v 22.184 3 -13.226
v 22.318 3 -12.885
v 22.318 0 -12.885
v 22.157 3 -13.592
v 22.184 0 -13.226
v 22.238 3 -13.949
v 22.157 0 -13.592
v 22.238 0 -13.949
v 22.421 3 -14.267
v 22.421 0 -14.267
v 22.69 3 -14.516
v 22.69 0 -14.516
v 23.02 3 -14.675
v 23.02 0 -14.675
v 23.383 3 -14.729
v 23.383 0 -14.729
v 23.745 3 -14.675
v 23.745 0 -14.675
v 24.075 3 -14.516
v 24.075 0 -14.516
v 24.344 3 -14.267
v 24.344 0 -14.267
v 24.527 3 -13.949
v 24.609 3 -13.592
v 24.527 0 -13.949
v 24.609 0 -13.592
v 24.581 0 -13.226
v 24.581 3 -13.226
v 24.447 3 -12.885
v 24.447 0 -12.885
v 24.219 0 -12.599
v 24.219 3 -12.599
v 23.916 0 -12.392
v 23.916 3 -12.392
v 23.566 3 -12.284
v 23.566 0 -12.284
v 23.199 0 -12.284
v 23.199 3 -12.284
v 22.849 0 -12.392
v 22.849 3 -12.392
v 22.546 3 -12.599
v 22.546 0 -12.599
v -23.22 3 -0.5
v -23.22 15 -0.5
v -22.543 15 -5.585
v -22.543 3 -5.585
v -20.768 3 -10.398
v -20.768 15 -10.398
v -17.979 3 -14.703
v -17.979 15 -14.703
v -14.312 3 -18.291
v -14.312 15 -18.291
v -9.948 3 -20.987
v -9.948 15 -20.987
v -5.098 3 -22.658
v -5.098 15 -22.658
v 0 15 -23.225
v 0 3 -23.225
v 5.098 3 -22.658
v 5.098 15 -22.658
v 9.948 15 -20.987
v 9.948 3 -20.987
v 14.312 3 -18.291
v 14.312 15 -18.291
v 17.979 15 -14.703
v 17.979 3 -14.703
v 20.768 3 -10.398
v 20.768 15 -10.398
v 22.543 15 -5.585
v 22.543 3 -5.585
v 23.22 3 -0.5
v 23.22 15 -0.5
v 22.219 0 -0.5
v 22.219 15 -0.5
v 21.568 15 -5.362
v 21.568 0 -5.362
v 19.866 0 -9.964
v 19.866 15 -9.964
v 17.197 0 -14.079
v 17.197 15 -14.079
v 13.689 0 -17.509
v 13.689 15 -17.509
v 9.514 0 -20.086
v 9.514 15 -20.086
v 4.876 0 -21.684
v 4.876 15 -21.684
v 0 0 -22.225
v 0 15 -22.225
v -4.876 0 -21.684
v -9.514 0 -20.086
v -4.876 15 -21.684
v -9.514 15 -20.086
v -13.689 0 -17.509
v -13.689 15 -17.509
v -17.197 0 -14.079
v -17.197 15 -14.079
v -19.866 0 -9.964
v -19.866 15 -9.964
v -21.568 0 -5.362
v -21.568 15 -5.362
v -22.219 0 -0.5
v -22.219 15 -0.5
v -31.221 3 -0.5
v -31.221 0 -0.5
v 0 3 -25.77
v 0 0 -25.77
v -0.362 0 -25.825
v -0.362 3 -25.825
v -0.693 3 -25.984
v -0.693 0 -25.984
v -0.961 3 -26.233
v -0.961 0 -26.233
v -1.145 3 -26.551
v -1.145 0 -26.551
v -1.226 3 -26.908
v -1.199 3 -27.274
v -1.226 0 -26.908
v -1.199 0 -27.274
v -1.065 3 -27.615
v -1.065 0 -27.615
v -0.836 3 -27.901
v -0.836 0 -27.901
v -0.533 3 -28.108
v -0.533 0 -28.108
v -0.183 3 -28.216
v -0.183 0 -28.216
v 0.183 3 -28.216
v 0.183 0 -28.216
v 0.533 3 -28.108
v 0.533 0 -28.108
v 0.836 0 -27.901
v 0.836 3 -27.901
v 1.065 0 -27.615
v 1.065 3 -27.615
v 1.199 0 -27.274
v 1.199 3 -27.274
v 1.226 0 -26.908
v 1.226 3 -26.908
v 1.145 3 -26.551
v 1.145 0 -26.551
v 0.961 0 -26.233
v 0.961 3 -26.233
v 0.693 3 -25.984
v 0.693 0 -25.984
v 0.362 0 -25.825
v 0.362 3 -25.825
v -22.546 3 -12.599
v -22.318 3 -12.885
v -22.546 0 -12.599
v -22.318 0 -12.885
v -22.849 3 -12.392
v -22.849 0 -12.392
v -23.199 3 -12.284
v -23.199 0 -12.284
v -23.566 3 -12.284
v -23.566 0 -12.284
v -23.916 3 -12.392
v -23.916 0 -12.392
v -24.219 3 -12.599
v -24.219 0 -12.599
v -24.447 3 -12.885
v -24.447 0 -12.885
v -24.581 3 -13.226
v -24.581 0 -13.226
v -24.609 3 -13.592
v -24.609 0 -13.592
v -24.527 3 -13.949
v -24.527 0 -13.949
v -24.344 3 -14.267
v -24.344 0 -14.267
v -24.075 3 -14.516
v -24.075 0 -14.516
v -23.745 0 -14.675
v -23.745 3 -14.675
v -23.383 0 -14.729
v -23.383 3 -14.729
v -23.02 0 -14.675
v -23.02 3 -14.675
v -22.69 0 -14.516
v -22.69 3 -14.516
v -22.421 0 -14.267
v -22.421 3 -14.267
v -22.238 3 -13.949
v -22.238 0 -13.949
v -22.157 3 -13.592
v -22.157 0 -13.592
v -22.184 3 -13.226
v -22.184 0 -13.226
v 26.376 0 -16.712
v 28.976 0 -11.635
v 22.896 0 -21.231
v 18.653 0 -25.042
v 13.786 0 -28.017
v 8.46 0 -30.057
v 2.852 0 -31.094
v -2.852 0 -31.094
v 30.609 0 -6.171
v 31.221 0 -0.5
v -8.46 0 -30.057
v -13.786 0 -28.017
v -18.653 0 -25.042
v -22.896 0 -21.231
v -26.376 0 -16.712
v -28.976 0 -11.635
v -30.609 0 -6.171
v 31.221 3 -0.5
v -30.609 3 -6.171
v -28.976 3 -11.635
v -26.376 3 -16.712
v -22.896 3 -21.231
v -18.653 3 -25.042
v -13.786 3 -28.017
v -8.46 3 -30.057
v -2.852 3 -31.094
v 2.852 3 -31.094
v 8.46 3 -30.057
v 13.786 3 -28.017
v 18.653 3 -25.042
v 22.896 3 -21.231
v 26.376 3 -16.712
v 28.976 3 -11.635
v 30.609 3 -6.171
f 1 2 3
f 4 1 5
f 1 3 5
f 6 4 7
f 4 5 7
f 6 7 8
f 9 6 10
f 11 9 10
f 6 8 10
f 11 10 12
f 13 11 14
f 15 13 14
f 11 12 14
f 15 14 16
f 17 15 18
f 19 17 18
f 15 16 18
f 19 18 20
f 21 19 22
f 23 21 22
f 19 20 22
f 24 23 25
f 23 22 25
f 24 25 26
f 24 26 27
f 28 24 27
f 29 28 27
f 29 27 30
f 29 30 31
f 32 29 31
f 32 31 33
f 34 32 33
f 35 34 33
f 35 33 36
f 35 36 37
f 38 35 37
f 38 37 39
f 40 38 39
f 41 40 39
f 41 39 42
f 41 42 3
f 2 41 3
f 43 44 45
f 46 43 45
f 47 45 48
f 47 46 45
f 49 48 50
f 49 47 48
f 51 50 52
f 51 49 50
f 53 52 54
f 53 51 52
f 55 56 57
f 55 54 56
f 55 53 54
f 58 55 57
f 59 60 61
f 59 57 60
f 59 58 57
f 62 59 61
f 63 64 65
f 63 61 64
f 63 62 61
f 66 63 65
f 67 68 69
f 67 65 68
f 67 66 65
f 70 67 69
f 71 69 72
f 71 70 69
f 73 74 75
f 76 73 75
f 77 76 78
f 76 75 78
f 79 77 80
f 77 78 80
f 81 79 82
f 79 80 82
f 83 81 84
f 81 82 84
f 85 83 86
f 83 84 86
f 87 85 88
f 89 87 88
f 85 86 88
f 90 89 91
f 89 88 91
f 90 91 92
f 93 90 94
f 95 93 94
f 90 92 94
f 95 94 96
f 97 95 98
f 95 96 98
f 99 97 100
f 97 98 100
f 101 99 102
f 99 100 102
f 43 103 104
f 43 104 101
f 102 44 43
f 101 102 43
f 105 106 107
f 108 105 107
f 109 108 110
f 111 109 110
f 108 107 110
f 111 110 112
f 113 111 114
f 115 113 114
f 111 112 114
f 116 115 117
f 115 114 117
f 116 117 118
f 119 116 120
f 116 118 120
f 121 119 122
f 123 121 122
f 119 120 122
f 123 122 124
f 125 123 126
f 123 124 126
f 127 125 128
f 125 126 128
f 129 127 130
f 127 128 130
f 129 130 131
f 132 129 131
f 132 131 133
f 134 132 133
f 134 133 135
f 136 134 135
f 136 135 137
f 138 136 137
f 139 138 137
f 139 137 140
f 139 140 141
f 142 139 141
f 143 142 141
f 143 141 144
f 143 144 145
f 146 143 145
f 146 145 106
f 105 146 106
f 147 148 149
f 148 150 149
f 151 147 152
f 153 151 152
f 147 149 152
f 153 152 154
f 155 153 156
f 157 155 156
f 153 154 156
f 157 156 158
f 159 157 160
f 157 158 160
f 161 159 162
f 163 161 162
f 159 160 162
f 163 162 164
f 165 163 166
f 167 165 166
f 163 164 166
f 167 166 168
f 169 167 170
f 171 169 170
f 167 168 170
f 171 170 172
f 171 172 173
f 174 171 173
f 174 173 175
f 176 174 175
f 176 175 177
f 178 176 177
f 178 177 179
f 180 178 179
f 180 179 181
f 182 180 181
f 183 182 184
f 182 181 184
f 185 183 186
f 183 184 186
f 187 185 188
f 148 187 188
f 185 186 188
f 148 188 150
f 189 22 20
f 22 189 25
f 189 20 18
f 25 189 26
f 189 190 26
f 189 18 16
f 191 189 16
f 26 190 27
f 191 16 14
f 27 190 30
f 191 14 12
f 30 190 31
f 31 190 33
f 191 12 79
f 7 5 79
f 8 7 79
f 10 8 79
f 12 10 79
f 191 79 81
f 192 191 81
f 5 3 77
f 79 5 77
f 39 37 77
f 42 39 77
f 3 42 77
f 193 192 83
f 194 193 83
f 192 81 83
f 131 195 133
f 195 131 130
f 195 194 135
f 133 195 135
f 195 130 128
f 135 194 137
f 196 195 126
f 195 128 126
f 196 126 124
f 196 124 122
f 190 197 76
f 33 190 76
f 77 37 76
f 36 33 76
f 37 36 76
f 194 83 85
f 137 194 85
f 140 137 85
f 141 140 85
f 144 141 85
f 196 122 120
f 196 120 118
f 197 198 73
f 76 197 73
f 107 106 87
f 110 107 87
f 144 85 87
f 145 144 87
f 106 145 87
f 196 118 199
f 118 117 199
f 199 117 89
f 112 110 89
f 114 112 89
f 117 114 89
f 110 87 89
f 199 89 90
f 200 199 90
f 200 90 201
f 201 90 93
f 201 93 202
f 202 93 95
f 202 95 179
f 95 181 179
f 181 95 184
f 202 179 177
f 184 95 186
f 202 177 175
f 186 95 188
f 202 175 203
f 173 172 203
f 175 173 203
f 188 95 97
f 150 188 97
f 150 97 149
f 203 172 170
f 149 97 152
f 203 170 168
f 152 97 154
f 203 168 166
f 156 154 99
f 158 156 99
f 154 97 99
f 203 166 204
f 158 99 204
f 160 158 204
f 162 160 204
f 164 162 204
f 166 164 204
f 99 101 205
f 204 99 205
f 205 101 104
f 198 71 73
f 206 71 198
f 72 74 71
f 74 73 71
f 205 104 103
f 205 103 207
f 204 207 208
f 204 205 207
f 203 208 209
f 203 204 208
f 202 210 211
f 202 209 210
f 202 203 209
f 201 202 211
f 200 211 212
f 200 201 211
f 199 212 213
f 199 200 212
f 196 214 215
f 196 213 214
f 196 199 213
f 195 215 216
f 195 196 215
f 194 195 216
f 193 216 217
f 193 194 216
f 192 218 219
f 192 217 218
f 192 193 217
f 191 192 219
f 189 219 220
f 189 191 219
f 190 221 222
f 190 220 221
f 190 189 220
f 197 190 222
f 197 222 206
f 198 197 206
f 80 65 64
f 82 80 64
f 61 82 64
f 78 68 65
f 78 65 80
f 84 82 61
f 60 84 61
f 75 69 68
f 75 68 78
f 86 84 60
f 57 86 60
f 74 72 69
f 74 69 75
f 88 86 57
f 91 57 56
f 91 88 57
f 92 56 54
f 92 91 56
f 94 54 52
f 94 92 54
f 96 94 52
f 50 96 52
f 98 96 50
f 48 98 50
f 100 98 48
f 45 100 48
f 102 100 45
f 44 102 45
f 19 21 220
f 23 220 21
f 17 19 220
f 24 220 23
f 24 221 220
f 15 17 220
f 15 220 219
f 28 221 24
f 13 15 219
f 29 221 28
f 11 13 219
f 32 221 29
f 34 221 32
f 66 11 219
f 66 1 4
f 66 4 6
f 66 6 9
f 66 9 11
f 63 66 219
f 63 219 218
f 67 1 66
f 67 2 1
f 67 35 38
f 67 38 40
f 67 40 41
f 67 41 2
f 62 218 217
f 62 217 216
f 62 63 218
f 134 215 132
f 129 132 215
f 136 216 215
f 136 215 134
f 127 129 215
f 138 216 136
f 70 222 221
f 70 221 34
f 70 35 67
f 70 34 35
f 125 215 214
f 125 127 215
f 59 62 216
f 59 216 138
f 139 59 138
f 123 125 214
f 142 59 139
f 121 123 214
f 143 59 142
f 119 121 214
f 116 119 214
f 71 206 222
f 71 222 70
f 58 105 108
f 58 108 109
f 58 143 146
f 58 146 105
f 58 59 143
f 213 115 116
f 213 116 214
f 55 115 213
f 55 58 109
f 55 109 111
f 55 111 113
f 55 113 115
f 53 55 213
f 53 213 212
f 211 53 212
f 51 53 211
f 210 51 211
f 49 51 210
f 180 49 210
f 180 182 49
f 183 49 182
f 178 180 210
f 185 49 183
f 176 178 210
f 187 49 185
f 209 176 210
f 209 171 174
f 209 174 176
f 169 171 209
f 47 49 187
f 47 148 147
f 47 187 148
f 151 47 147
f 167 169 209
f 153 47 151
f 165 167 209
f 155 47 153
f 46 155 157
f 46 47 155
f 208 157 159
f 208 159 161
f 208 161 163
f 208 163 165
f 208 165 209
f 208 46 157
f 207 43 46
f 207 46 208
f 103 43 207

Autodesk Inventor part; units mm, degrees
ref_plane "YZ Plane" through (0, 0, 0) normal (1, 0, 0) x (0, 1, 0)
ref_plane "XZ Plane" through (0, 0, 0) normal (0, 1, 0) x (-1, 0, 0)
ref_plane "XY Plane" through (0, 0, 0) normal (0, 0, 1) x (1, 0, 0)
sketch "Sketch1" plane through (0, 0, 0) normal (0, 0, 1) x (1, 0, 0)
  line L0 (-31.225, 0) -> (-22.225, 0)
  line L1 (-22.225, 0) -> (-22.225, 15)
  line L2 (-22.225, 15) -> (-23.225, 15)
  line L3 (-23.225, 15) -> (-23.225, 3)
  line L4 (-23.225, 3) -> (-31.225, 3)
  line L5 (-31.225, 3) -> (-31.225, 0)
  line L6 (0, -3) -> (0, 18) projected
  point P0 (0, 0)
  dimension "d0" = 3
  dimension "d1" = 1
  dimension "d2" = 15
  dimension "d3" = 22.225
  dimension "d17" = 9
revolve "Revolution1" add sketch "Sketch1" angle 360 about axis through (0, -10, 0) along (0, 1, 0)
sketch "Sketch2" plane through (0, 3, 0) normal (0, 1, 0) x (1, 0, 0)
  point P0 (0, 0)
  point P1 (0, 27)
  dimension "d6" = 27
hole "Hole1" at (0, 3, -27) direction (0, -1, 0) diameter 2.459 end through all thread size "M3x0.5" class "6H" standard "ISO Metric profile"
sketch "Sketch3" plane through (0, 15, 0) normal (0, 1, 0) x (1, 0, 0)
  line L0 (-31.225, 0.5) -> (31.225, 0.5)
  line L1 (31.225, 0.5) -> (31.225, -31.225)
  line L2 (31.225, -31.225) -> (-31.225, -31.225)
  line L3 (-31.225, -31.225) -> (-31.225, 0.5)
  circle A0 centre (0, 0) radius 31.225 projected
  circle A1 centre (0, 0) radius 23.225 projected
  point P0 (31.225, 0)
  point P1 (31.221, 0.5)
  point P2 (-31.221, 0.5)
  point P3 (-31.225, 0)
  point P4 (0, -31.225)
  point P5 (23.2196, 0.5)
  point P6 (-23.2196, 0.5)
  dimension "d14" = 0.5
extrude "Extrusion1" cut sketch "Sketch3" against normal blind 15 contours L0 A1 A0 | A0 L2 L3 | L0 A1 | A0 L1 L2 picked at (-27.077, -8.535) picked at (5.7691, -4.8291)
pattern_circular "Circular Pattern1" count 6 over 360 about axis through (0, 7.5, 0) along (0, 1, 0) of "Hole1"
properties part number "LowerClamp" material "Brass, Soft Yellow"
